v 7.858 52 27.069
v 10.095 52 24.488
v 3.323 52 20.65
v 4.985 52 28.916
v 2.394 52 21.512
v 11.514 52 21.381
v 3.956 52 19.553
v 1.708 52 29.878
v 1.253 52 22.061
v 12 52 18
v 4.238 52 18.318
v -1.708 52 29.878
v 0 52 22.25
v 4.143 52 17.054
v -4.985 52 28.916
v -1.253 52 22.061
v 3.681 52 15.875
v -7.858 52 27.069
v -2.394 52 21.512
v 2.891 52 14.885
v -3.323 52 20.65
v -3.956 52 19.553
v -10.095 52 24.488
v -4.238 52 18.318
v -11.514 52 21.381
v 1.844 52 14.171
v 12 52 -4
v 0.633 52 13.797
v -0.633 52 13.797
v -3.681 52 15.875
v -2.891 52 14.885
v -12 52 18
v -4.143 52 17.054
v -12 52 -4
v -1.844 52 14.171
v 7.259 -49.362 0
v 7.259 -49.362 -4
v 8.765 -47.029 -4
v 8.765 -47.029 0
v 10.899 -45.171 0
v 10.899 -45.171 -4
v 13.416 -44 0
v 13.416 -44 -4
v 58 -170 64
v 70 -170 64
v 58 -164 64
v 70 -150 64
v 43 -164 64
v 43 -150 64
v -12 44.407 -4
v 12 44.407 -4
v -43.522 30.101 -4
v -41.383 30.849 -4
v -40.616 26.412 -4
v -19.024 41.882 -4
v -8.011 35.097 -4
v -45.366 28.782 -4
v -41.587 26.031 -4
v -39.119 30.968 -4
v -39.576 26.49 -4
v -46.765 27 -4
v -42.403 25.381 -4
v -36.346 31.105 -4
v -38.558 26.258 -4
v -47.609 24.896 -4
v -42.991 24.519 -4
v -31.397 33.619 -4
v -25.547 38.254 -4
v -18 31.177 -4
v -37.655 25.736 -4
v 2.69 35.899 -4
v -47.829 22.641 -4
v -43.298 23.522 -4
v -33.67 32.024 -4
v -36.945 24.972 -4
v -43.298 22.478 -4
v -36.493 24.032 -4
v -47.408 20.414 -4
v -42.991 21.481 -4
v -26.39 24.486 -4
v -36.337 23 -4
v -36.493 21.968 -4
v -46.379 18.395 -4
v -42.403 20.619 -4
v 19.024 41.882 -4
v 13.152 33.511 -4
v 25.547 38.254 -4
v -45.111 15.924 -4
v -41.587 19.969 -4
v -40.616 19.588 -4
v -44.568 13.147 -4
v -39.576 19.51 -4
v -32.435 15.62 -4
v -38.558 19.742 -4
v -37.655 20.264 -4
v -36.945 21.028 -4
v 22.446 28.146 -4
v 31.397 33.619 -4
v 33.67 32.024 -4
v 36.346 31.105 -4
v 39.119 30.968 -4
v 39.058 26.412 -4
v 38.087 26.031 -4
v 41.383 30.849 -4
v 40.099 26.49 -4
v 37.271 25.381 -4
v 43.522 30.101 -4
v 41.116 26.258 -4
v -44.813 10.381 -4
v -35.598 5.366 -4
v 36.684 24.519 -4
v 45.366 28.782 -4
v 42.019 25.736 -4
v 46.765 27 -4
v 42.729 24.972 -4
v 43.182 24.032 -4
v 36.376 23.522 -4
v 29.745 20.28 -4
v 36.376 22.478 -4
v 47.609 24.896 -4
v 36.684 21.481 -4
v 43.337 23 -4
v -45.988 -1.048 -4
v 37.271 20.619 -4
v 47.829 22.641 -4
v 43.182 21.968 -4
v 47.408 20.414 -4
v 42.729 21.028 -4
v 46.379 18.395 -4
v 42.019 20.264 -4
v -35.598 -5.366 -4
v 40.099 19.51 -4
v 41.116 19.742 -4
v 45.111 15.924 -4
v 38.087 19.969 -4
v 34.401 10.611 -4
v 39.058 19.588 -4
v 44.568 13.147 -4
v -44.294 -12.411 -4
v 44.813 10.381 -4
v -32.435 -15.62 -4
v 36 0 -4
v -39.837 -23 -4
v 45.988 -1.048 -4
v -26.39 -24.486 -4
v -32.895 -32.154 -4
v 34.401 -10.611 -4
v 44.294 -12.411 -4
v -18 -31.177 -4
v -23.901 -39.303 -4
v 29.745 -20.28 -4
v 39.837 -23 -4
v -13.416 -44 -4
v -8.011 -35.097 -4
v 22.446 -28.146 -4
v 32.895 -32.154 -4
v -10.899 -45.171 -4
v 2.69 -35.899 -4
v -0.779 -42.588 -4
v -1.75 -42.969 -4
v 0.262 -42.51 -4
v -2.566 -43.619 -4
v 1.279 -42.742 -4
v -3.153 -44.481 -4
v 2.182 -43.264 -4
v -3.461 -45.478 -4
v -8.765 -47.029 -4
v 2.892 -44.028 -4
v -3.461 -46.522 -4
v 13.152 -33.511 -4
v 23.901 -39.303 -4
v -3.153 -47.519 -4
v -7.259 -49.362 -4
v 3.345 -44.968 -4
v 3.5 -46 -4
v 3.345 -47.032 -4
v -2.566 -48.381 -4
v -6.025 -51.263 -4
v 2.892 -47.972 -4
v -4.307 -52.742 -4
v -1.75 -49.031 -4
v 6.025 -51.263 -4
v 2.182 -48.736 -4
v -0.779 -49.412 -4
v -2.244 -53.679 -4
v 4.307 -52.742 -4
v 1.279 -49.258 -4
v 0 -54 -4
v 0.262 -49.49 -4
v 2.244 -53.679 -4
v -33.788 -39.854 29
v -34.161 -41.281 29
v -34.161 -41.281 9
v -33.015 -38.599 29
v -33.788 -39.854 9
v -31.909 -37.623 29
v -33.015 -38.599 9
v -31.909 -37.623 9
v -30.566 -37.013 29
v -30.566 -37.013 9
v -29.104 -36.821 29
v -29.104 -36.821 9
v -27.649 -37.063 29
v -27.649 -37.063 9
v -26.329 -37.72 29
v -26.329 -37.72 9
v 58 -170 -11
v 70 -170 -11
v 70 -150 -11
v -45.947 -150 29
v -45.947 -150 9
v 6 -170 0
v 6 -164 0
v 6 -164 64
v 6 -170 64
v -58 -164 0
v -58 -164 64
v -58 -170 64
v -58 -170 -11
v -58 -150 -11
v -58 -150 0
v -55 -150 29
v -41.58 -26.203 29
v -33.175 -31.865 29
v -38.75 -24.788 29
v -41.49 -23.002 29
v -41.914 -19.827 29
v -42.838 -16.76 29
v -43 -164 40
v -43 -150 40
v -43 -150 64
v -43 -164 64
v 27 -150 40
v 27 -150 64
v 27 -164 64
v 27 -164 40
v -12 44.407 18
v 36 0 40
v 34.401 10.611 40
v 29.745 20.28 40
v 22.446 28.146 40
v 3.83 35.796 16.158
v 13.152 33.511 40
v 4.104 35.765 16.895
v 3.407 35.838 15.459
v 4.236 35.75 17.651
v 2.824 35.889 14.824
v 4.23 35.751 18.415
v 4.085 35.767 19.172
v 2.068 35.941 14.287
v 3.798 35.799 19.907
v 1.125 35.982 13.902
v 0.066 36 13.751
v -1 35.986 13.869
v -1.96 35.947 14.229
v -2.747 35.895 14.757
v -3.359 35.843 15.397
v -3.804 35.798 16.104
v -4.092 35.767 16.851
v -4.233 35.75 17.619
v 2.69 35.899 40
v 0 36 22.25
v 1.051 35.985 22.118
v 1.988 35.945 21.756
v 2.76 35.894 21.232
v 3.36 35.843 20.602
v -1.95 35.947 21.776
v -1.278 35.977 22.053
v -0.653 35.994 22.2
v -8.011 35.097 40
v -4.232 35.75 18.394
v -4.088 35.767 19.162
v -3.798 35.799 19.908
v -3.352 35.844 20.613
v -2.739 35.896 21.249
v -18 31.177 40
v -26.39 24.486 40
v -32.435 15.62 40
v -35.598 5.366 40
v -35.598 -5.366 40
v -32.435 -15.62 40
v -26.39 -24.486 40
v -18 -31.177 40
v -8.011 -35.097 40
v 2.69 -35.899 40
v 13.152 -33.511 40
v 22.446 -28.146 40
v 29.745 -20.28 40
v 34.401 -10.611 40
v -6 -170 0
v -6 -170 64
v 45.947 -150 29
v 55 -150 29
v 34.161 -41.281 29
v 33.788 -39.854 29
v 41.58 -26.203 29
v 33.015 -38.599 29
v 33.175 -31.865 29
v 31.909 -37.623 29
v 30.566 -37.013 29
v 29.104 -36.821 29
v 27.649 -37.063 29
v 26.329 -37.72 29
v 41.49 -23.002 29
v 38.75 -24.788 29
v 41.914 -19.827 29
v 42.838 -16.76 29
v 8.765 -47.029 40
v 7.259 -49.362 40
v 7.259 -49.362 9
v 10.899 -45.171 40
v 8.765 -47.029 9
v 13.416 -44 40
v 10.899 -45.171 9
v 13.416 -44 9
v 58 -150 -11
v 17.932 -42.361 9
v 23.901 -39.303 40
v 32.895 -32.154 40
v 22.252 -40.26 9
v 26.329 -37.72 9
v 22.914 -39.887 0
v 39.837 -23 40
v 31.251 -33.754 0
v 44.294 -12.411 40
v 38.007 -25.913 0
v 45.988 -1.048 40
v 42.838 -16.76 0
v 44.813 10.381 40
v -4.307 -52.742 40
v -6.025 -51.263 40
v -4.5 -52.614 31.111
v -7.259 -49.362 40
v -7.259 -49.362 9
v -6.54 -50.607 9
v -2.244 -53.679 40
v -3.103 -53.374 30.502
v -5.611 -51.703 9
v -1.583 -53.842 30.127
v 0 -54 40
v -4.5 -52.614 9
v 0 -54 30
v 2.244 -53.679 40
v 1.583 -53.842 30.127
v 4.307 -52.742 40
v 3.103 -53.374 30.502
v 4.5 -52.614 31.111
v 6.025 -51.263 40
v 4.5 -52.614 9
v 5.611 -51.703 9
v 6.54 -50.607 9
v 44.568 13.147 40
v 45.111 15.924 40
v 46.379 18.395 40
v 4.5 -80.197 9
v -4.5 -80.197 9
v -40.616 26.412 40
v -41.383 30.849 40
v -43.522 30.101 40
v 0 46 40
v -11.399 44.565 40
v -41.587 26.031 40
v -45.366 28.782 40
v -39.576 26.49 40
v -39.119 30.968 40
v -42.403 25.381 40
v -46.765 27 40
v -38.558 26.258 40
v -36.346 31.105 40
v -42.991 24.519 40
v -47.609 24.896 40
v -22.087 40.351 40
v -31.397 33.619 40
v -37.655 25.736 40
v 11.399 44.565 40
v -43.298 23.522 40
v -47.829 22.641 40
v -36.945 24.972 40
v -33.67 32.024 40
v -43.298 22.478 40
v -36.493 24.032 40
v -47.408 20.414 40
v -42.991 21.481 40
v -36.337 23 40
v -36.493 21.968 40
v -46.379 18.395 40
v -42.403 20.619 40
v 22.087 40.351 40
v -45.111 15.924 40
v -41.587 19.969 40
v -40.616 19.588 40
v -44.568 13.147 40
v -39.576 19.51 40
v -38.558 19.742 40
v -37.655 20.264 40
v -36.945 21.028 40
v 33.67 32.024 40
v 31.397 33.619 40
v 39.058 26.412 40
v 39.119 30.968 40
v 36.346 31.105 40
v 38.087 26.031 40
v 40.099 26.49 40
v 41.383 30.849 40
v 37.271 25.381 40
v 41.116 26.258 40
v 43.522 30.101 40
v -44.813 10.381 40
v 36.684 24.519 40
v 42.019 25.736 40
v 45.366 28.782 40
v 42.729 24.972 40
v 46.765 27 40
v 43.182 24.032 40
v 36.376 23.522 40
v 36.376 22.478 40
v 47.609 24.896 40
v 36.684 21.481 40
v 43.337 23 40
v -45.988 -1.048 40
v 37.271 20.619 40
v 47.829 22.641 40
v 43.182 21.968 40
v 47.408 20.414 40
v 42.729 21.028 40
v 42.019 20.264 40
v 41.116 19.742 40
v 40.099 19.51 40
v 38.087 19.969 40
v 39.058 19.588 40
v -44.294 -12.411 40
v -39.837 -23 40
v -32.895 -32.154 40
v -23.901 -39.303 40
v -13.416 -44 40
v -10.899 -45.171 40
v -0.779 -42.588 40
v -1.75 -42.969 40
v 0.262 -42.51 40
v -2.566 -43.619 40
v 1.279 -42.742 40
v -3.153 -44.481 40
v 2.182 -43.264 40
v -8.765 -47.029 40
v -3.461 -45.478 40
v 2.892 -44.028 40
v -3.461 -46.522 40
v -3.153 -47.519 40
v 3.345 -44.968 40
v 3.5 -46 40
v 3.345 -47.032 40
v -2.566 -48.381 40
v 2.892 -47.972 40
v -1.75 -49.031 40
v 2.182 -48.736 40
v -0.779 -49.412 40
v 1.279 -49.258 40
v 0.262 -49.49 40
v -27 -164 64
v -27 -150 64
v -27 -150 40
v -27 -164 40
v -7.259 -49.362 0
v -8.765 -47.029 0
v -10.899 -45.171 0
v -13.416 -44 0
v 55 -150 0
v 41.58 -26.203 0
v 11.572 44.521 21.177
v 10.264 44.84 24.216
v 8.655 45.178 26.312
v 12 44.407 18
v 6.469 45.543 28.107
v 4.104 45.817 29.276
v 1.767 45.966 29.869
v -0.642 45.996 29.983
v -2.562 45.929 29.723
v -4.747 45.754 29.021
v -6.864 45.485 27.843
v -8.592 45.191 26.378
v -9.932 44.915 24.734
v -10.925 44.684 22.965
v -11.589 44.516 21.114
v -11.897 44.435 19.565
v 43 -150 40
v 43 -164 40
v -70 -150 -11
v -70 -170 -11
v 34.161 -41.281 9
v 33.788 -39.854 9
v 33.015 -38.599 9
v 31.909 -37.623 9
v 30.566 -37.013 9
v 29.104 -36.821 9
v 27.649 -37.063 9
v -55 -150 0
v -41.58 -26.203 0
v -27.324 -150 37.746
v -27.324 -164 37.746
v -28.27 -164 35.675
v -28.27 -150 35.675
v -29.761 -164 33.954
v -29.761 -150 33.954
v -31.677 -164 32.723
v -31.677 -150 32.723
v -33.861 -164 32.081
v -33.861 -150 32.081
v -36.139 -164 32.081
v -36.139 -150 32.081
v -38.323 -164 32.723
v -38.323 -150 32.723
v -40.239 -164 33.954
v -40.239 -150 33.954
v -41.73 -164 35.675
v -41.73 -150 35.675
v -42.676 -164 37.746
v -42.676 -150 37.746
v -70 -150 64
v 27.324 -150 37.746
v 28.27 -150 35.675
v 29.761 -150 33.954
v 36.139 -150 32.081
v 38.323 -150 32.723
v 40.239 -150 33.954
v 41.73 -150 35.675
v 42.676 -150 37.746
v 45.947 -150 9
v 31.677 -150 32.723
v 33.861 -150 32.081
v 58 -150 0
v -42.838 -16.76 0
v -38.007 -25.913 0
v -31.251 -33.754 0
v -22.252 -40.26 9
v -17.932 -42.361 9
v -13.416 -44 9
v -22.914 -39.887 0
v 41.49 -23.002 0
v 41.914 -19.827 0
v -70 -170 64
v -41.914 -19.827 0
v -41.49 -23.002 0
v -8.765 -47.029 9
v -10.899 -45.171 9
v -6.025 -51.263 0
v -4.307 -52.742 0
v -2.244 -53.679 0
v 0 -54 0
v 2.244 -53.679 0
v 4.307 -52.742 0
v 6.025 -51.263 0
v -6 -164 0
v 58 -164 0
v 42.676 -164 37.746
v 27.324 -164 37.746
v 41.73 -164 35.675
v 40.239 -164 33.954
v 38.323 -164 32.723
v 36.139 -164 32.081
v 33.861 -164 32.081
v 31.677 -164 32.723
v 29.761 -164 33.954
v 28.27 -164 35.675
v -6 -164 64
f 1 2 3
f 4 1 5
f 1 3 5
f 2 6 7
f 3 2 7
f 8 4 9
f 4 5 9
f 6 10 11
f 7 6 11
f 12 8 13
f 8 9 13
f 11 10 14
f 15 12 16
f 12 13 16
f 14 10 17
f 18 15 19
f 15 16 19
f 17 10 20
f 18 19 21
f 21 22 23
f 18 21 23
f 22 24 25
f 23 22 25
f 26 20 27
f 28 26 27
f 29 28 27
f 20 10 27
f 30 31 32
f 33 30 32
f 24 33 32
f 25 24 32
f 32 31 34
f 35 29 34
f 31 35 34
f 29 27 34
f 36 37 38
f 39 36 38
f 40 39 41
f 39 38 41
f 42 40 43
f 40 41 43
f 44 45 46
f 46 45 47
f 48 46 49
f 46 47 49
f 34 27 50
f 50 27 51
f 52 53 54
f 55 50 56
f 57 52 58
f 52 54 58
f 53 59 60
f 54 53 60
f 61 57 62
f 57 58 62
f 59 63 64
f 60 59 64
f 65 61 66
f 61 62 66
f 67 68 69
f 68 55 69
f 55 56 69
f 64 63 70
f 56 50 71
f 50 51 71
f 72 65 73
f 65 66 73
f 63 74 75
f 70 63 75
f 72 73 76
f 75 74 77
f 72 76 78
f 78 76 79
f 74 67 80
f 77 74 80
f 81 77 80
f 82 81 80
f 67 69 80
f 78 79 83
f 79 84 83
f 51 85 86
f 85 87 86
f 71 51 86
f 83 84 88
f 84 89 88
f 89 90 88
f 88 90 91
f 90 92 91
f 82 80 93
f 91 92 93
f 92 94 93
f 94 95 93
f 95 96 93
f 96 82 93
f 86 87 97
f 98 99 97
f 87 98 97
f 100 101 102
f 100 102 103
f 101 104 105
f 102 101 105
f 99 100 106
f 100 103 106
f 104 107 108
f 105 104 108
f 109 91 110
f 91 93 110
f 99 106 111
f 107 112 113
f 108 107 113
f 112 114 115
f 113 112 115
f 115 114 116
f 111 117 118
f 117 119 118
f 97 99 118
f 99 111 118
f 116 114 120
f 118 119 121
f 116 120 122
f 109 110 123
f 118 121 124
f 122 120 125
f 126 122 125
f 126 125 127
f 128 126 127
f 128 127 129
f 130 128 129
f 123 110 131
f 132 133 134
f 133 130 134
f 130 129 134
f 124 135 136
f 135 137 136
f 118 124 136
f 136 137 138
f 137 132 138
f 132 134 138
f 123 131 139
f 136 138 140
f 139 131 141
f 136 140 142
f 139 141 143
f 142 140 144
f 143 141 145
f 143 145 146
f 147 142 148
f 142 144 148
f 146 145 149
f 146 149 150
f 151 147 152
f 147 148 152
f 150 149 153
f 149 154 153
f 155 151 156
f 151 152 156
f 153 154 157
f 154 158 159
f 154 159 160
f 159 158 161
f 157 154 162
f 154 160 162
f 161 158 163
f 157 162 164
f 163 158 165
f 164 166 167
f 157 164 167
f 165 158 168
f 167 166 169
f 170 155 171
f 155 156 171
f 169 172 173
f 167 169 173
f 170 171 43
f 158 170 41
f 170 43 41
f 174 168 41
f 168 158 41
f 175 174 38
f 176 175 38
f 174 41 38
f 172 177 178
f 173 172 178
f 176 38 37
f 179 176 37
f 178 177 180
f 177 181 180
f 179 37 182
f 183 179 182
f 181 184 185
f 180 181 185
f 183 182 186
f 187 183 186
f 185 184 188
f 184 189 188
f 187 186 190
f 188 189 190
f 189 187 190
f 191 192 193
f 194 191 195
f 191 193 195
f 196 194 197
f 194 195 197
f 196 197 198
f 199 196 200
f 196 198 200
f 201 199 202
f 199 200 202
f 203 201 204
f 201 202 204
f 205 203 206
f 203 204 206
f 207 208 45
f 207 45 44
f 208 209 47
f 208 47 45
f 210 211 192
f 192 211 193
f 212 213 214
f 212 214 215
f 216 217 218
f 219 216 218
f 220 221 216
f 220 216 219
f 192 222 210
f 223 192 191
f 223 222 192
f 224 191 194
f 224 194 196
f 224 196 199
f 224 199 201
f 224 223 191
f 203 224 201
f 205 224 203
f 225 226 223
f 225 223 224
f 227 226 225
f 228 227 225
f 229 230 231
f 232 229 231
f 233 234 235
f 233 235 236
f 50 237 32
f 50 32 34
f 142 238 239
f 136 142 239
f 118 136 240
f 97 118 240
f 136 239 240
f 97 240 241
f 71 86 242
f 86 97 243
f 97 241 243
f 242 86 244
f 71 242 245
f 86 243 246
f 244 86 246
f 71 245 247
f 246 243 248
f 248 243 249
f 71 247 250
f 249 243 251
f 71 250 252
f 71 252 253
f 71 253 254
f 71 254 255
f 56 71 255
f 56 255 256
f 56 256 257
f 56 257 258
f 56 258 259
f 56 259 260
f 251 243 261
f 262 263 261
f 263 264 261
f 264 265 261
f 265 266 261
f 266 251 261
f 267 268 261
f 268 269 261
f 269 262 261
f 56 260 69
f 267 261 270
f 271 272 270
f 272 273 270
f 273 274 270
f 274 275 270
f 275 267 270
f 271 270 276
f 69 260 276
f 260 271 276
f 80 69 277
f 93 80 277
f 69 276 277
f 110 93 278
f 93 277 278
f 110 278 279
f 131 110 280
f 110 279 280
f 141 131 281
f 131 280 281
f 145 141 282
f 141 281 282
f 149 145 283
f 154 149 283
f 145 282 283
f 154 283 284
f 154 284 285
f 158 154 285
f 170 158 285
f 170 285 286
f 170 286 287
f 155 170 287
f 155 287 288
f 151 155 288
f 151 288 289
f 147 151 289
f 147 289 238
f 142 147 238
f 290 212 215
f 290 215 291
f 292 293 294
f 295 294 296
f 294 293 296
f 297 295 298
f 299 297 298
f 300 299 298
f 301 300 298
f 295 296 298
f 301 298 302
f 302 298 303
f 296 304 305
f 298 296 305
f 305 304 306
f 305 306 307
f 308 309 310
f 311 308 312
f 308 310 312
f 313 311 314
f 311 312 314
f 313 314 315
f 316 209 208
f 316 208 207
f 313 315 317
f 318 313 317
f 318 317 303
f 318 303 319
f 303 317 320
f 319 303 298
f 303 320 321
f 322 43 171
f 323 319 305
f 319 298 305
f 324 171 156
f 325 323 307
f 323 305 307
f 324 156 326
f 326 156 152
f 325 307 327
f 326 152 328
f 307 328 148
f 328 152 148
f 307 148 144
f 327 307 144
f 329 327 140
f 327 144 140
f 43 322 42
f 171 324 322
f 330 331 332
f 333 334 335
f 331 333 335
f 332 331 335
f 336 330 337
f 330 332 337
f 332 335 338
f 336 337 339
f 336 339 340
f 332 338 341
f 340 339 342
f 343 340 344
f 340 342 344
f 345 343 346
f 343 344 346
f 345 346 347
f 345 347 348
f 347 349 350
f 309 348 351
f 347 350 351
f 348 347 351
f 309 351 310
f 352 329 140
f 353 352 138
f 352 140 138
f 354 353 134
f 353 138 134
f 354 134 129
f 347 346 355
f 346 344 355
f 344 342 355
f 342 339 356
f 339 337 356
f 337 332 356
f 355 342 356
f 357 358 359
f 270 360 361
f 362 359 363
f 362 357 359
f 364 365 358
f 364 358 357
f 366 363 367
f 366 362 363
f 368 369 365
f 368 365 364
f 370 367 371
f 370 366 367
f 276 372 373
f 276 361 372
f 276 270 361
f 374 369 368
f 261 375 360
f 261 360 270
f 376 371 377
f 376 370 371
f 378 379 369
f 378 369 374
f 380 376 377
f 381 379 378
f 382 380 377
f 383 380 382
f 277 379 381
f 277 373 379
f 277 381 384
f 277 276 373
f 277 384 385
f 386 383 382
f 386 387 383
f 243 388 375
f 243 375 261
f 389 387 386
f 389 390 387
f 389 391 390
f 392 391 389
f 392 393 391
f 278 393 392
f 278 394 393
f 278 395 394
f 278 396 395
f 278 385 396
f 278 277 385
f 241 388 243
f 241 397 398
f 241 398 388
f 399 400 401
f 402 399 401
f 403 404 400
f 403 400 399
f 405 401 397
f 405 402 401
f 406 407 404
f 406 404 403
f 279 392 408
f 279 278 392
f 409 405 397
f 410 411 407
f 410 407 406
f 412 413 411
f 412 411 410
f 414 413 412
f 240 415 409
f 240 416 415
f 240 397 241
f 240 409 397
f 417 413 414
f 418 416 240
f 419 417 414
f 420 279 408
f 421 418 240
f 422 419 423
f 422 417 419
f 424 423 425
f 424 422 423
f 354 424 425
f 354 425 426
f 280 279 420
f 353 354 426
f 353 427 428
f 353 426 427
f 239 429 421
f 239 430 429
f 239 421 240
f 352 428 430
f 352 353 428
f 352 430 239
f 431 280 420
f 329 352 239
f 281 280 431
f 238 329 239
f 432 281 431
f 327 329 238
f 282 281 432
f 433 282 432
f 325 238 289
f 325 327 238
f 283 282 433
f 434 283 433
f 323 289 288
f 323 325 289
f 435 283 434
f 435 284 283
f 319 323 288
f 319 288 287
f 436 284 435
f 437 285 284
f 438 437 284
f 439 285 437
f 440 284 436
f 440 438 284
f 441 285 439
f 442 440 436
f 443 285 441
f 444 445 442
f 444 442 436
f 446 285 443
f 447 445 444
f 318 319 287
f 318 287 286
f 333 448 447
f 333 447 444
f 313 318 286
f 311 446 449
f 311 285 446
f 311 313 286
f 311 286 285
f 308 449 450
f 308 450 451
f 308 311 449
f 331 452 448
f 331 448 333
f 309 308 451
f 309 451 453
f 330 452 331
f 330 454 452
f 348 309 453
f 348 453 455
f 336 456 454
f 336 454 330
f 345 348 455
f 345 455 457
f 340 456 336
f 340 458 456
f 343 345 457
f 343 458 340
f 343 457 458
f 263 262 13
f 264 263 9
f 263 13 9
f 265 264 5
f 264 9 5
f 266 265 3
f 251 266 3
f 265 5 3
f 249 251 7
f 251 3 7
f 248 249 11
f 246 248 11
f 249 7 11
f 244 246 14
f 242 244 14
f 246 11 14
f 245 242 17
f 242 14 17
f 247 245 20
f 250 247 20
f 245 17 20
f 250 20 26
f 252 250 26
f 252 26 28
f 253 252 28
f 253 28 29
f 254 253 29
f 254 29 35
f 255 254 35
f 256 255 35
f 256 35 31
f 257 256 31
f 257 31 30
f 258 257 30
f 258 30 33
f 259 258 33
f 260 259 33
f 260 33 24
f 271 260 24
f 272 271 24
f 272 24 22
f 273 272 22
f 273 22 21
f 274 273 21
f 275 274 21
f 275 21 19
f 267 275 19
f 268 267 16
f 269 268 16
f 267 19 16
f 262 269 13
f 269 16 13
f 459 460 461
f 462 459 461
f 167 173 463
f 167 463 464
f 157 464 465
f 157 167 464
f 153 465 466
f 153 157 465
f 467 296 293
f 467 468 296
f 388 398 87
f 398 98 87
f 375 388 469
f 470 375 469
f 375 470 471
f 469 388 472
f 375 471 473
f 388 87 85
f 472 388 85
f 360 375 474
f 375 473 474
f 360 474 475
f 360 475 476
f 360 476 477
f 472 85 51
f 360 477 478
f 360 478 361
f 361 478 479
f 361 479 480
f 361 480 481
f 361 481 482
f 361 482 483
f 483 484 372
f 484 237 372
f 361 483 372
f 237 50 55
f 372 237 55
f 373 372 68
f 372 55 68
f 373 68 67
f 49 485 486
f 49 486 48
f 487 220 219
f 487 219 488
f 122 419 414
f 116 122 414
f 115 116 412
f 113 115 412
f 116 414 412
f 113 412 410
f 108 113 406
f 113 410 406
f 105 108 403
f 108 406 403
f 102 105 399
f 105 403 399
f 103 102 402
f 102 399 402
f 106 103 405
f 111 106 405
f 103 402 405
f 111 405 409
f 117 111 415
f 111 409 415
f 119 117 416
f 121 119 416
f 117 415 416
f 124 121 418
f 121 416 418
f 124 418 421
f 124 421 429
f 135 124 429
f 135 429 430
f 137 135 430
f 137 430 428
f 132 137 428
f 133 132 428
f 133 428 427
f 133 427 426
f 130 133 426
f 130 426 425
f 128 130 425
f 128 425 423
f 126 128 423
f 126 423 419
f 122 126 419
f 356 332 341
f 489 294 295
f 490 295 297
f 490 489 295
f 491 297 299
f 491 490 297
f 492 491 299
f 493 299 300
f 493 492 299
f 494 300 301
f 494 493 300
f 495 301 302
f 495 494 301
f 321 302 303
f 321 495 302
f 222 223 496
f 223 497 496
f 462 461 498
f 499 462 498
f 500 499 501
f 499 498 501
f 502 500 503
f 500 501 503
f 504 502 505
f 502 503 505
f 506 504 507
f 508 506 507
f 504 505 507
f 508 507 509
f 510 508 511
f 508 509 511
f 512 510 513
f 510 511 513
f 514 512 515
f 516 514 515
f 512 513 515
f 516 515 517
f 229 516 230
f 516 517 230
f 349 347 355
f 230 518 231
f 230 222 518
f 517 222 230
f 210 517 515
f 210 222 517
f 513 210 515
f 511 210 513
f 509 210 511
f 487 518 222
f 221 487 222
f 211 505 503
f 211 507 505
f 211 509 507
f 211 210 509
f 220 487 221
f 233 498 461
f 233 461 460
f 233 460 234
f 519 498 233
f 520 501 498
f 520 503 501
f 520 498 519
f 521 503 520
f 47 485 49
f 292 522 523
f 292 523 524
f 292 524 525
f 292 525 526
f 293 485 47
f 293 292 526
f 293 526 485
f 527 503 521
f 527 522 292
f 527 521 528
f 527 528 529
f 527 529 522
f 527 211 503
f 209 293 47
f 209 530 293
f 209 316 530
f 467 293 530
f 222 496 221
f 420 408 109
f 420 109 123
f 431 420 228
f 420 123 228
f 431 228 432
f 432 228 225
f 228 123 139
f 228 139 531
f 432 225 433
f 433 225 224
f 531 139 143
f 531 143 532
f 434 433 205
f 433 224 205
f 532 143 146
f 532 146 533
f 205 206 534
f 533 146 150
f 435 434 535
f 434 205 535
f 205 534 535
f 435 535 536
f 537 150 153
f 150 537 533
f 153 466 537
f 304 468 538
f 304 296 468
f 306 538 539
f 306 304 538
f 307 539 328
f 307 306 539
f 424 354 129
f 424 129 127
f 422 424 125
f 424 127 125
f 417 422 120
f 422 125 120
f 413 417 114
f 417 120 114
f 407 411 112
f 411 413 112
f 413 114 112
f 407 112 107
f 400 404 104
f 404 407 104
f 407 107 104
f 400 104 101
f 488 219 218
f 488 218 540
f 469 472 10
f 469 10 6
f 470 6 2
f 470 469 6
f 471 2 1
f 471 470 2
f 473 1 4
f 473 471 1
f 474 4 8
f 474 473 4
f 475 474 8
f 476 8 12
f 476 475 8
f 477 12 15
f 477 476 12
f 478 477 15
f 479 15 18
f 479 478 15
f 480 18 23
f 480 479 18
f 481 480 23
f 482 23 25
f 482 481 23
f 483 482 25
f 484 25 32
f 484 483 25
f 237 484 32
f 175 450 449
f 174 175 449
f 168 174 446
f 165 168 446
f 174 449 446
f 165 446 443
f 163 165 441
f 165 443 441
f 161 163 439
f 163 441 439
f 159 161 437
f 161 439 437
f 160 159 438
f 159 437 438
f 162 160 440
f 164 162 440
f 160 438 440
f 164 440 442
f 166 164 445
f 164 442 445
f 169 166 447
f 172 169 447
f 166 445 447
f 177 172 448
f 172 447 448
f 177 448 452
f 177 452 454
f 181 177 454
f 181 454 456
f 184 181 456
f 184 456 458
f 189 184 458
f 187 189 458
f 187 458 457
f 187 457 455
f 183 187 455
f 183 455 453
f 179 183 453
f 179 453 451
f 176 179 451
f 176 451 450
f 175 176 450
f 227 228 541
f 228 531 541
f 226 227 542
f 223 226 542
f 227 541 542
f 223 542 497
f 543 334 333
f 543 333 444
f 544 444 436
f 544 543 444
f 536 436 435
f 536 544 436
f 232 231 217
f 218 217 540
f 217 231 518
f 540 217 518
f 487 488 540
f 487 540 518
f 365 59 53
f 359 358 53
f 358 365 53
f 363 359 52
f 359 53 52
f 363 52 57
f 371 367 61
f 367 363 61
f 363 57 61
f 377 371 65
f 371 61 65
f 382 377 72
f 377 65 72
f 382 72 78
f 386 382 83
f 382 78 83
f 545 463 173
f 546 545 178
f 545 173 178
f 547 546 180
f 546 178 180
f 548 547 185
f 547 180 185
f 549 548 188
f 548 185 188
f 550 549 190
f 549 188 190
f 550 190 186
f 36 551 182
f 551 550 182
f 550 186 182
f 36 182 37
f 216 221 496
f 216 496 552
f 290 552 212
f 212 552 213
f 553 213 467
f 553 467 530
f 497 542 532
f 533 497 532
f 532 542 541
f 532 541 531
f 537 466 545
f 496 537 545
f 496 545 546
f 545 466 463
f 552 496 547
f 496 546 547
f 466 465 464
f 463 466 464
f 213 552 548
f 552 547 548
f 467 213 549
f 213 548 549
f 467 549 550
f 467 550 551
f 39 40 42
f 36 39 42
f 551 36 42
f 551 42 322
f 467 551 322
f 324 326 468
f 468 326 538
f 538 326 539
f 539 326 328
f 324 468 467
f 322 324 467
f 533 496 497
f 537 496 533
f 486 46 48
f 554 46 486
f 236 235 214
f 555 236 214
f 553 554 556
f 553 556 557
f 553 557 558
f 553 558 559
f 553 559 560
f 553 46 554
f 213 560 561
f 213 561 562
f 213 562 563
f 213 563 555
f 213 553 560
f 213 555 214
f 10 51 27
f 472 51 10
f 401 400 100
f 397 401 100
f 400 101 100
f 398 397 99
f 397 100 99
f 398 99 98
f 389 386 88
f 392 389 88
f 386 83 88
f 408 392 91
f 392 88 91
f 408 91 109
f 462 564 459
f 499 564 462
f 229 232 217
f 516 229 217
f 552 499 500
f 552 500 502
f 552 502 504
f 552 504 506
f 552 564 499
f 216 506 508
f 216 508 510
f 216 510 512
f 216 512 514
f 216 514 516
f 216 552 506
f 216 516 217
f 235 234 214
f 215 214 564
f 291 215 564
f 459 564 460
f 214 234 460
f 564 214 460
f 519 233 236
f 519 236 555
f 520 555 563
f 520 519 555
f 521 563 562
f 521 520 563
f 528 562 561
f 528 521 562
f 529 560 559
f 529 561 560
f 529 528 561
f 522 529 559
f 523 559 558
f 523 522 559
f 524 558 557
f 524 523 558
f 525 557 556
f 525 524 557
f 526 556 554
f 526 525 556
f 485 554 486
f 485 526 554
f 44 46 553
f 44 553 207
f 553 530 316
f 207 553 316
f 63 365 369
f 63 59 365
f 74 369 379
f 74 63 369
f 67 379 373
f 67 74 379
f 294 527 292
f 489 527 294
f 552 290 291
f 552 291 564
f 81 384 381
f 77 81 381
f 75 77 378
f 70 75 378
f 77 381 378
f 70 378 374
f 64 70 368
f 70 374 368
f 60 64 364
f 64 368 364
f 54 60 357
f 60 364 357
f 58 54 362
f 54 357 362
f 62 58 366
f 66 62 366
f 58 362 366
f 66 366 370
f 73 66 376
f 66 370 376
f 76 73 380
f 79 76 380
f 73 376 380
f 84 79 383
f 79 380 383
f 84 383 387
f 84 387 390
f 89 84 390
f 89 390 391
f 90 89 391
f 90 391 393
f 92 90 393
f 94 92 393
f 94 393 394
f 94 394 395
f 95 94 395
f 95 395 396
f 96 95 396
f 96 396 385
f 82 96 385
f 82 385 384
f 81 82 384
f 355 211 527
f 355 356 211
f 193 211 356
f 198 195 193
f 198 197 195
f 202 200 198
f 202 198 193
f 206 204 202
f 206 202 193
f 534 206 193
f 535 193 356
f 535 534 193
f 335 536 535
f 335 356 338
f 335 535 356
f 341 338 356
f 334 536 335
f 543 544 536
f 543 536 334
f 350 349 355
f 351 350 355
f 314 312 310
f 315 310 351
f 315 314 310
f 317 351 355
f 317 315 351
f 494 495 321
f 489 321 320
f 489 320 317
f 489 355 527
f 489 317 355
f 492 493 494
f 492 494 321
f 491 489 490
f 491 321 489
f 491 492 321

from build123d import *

# Parameters (mm, degrees)
EXTRUDE_1_DEPTH                  = 40
EXTRUDE_1_DEPTH_BACK             = 4
SKETCH_1_R                       = 46
EXTRUDE_START                    = -4
SKETCH_2_R                       = 8
EXTRUDE_2_DEPTH                  = 44
FILLET_1_R                       = 10
PATTERN_CIRCULAR_1_COUNT         = 3
FILLET_1_OF_PATTERN_CIRCULAR_1_R = 10
EXTRUDE_3_DEPTH                  = 52
EXTRUDE_4_DEPTH                  = 9
EXTRUDE_5_DEPTH                  = 20
FILLET_2_R                       = 20
FILLET_3_R                       = 5
RIB_1_REACH                      = 166.697
SKETCH_6_WALL_W                  = 367.279305732
SKETCH_6_WALL_H                  = 9
EXTRUDE_6_DEPTH                  = 64
EXTRUDE_6_DEPTH_BACK             = 11
SKETCH_8_W                       = 116
SKETCH_8_H                       = 11
CUT_EXTRUDE_1_DEPTH              = 64
SKETCH_9_R                       = 36
SKETCH_9_R_2                     = 3.5
CUT_EXTRUDE_2_DEPTH              = 64
HOLE_WIZARD_M10_1_REACH          = 239.276
HOLE_WIZARD_M10_1_BORE_R         = 4.25


with BuildPart() as part:
    # 草图1 → 凸台-拉伸1 (new, two sides: drawn at the far end of the back side and taken through both)
    with BuildSketch(Plane.XY.offset(-EXTRUDE_1_DEPTH_BACK)):
        Circle(SKETCH_1_R)
    extrude(amount=EXTRUDE_1_DEPTH + EXTRUDE_1_DEPTH_BACK)

    # 草图2 → 凸台-拉伸2 (add)
    with BuildSketch(Plane.XY.offset(EXTRUDE_START)):
        with Locations((0, -46)):
            Circle(SKETCH_2_R)
    extrude_2 = extrude(amount=EXTRUDE_2_DEPTH)

    # 圆角1
    fillet_1_edges = [part.edges().sort_by_distance(p)[0] for p in [
        (7.969696861, -45.304347826, 18),
        (-7.969696861, -45.304347826, 18),
    ]]
    fillet(fillet_1_edges, radius=FILLET_1_R)

    # 阵列(圆周)1: 凸台-拉伸2 ×3 about axis
    pattern_circular_1_axis = Axis((0, 0, 0), (0, 0, 1))
    for i in range(1, PATTERN_CIRCULAR_1_COUNT):
        add(extrude_2.rotate(pattern_circular_1_axis, i * 360 / PATTERN_CIRCULAR_1_COUNT))

    # 圆角1 of 阵列(圆周)1
    fillet_1_of_pattern_circular_1_edges = [part.edges().sort_by_distance(p)[0] for p in [
        (35.249867689, 29.554133855, 18),
        (43.21956455, 15.750213971, 18),
        (-43.21956455, 15.750213971, 18),
        (-35.249867689, 29.554133855, 18),
    ]]
    fillet(fillet_1_of_pattern_circular_1_edges, radius=FILLET_1_OF_PATTERN_CIRCULAR_1_R)

    # 草图3 → 凸台-拉伸3 (add)
    with BuildSketch(Plane(origin=(0, 0, 0), x_dir=(1, 0, 0), z_dir=(0, 1, 0))):
        with BuildLine():
            Line((-12, 4), (12, 4))
            Line((12, 4), (12, -18))
            ThreePointArc((12, -18), (0, -30), (-12, -18))
            Line((-12, -18), (-12, 4))
        make_face()
    extrude(amount=EXTRUDE_3_DEPTH)

    # 草图4 → 凸台-拉伸4 (add)
    with BuildSketch(Plane.XY):
        Polygon((-55, -150), (55, -150), (41, -20.856653615), (-41, -20.856653615), align=None)
    extrude(amount=EXTRUDE_4_DEPTH)

    # 草图5 → 凸台-拉伸5 (add)
    with BuildSketch(Plane.XY.offset(9)):
        Polygon((-41, -20.856653615), (-55, -150), (-45.947270441, -150), (-32.052422425, -21.826630695), align=None)
    extrude_5 = extrude(amount=EXTRUDE_5_DEPTH)

    # 镜向1: 凸台-拉伸5 across plane
    add(extrude_5.mirror(Plane(origin=(0, 0, 0), x_dir=(0, 0, 1), z_dir=(1, 0, 0))))

    # 圆角2
    fillet_2_edges = [part.edges().sort_by_distance(p)[0] for p in [
        (41, -20.856653615, 14.5),
        (-41, -20.856653615, 14.5),
    ]]
    fillet(fillet_2_edges, radius=FILLET_2_R)

    # 圆角3
    fillet_3_edges = [part.edges().sort_by_distance(p)[0] for p in [
        (-33.144192236, -31.897688333, 19),
        (33.144192236, -31.897688333, 19),
    ]]
    fillet(fillet_3_edges, radius=FILLET_3_R)

    # 草图6 wall → 筋1 (add, up to next)
    with BuildSketch(Plane(origin=(0, -68, 18.777260671), x_dir=(0, -0.780250226157, -0.625467492826), z_dir=(0, 0.625467492826, -0.780250226157)), mode=Mode.PRIVATE) as rib_1_sk1:
        Rectangle(SKETCH_6_WALL_W, SKETCH_6_WALL_H)
    rib_1_tool1 = extrude(rib_1_sk1.sketch, amount=RIB_1_REACH, mode=Mode.PRIVATE) - part.part
    add(rib_1_tool1.solids().sort_by_distance((0, -68, 18.777260671))[0])

    # 草图7 → 凸台-拉伸6 (add, two sides: drawn at the far end of the back side and taken through both)
    with BuildSketch(Plane.XY.offset(-EXTRUDE_6_DEPTH_BACK)):
        Polygon((-70, -150), (70, -150), (70, -170), (58, -170), (58, -164), (6, -164), (6, -170), (-6, -170), (-6, -164), (-58, -164), (-58, -170), (-70, -170), align=None)
    extrude(amount=EXTRUDE_6_DEPTH + EXTRUDE_6_DEPTH_BACK)

    # 草图8 → 切除-拉伸1 (cut)
    with BuildSketch(Plane(origin=(0, -150, 0), x_dir=(1, 0, 0), z_dir=(0, 1, 0))):
        with Locations((0, 5.5)):
            Rectangle(SKETCH_8_W, SKETCH_8_H)
        with BuildLine():
            Line((-43, -40), (-43, -64))
            Line((-43, -64), (-27, -64))
            Line((-27, -64), (-27, -40))
            ThreePointArc((-27, -40), (-35, -32), (-43, -40))
        make_face()
        with BuildLine():
            Line((43, -40), (43, -64))
            Line((43, -64), (27, -64))
            Line((27, -64), (27, -40))
            ThreePointArc((27, -40), (35, -32), (43, -40))
        make_face()
    extrude(amount=-CUT_EXTRUDE_1_DEPTH, mode=Mode.SUBTRACT)

    # 草图9 → 切除-拉伸2 (cut)
    with BuildSketch(Plane.XY.offset(40)):
        Circle(SKETCH_9_R)
        with Locations((-39.837168574, 23)):
            Circle(SKETCH_9_R_2)
        with Locations((39.837168574, 23)):
            Circle(SKETCH_9_R_2)
        with Locations((0, -46)):
            Circle(SKETCH_9_R_2)
    extrude(amount=-CUT_EXTRUDE_2_DEPTH, mode=Mode.SUBTRACT)

    # M10 螺纹孔1 bore (on position points) → M10 螺纹孔1 (cut, up to next)
    with BuildSketch(Plane(origin=(0, 52, 18), x_dir=(0, 0, 1), z_dir=(0, 1, 0)), mode=Mode.PRIVATE) as hole_wizard_m10_1_sk1:
        Circle(HOLE_WIZARD_M10_1_BORE_R)
    hole_wizard_m10_1_tool1 = extrude(hole_wizard_m10_1_sk1.sketch, amount=-HOLE_WIZARD_M10_1_REACH, mode=Mode.PRIVATE) & part.part
    add(hole_wizard_m10_1_tool1.solids().sort_by_distance((0, 52, 18))[0], mode=Mode.SUBTRACT)


solid = part.part
